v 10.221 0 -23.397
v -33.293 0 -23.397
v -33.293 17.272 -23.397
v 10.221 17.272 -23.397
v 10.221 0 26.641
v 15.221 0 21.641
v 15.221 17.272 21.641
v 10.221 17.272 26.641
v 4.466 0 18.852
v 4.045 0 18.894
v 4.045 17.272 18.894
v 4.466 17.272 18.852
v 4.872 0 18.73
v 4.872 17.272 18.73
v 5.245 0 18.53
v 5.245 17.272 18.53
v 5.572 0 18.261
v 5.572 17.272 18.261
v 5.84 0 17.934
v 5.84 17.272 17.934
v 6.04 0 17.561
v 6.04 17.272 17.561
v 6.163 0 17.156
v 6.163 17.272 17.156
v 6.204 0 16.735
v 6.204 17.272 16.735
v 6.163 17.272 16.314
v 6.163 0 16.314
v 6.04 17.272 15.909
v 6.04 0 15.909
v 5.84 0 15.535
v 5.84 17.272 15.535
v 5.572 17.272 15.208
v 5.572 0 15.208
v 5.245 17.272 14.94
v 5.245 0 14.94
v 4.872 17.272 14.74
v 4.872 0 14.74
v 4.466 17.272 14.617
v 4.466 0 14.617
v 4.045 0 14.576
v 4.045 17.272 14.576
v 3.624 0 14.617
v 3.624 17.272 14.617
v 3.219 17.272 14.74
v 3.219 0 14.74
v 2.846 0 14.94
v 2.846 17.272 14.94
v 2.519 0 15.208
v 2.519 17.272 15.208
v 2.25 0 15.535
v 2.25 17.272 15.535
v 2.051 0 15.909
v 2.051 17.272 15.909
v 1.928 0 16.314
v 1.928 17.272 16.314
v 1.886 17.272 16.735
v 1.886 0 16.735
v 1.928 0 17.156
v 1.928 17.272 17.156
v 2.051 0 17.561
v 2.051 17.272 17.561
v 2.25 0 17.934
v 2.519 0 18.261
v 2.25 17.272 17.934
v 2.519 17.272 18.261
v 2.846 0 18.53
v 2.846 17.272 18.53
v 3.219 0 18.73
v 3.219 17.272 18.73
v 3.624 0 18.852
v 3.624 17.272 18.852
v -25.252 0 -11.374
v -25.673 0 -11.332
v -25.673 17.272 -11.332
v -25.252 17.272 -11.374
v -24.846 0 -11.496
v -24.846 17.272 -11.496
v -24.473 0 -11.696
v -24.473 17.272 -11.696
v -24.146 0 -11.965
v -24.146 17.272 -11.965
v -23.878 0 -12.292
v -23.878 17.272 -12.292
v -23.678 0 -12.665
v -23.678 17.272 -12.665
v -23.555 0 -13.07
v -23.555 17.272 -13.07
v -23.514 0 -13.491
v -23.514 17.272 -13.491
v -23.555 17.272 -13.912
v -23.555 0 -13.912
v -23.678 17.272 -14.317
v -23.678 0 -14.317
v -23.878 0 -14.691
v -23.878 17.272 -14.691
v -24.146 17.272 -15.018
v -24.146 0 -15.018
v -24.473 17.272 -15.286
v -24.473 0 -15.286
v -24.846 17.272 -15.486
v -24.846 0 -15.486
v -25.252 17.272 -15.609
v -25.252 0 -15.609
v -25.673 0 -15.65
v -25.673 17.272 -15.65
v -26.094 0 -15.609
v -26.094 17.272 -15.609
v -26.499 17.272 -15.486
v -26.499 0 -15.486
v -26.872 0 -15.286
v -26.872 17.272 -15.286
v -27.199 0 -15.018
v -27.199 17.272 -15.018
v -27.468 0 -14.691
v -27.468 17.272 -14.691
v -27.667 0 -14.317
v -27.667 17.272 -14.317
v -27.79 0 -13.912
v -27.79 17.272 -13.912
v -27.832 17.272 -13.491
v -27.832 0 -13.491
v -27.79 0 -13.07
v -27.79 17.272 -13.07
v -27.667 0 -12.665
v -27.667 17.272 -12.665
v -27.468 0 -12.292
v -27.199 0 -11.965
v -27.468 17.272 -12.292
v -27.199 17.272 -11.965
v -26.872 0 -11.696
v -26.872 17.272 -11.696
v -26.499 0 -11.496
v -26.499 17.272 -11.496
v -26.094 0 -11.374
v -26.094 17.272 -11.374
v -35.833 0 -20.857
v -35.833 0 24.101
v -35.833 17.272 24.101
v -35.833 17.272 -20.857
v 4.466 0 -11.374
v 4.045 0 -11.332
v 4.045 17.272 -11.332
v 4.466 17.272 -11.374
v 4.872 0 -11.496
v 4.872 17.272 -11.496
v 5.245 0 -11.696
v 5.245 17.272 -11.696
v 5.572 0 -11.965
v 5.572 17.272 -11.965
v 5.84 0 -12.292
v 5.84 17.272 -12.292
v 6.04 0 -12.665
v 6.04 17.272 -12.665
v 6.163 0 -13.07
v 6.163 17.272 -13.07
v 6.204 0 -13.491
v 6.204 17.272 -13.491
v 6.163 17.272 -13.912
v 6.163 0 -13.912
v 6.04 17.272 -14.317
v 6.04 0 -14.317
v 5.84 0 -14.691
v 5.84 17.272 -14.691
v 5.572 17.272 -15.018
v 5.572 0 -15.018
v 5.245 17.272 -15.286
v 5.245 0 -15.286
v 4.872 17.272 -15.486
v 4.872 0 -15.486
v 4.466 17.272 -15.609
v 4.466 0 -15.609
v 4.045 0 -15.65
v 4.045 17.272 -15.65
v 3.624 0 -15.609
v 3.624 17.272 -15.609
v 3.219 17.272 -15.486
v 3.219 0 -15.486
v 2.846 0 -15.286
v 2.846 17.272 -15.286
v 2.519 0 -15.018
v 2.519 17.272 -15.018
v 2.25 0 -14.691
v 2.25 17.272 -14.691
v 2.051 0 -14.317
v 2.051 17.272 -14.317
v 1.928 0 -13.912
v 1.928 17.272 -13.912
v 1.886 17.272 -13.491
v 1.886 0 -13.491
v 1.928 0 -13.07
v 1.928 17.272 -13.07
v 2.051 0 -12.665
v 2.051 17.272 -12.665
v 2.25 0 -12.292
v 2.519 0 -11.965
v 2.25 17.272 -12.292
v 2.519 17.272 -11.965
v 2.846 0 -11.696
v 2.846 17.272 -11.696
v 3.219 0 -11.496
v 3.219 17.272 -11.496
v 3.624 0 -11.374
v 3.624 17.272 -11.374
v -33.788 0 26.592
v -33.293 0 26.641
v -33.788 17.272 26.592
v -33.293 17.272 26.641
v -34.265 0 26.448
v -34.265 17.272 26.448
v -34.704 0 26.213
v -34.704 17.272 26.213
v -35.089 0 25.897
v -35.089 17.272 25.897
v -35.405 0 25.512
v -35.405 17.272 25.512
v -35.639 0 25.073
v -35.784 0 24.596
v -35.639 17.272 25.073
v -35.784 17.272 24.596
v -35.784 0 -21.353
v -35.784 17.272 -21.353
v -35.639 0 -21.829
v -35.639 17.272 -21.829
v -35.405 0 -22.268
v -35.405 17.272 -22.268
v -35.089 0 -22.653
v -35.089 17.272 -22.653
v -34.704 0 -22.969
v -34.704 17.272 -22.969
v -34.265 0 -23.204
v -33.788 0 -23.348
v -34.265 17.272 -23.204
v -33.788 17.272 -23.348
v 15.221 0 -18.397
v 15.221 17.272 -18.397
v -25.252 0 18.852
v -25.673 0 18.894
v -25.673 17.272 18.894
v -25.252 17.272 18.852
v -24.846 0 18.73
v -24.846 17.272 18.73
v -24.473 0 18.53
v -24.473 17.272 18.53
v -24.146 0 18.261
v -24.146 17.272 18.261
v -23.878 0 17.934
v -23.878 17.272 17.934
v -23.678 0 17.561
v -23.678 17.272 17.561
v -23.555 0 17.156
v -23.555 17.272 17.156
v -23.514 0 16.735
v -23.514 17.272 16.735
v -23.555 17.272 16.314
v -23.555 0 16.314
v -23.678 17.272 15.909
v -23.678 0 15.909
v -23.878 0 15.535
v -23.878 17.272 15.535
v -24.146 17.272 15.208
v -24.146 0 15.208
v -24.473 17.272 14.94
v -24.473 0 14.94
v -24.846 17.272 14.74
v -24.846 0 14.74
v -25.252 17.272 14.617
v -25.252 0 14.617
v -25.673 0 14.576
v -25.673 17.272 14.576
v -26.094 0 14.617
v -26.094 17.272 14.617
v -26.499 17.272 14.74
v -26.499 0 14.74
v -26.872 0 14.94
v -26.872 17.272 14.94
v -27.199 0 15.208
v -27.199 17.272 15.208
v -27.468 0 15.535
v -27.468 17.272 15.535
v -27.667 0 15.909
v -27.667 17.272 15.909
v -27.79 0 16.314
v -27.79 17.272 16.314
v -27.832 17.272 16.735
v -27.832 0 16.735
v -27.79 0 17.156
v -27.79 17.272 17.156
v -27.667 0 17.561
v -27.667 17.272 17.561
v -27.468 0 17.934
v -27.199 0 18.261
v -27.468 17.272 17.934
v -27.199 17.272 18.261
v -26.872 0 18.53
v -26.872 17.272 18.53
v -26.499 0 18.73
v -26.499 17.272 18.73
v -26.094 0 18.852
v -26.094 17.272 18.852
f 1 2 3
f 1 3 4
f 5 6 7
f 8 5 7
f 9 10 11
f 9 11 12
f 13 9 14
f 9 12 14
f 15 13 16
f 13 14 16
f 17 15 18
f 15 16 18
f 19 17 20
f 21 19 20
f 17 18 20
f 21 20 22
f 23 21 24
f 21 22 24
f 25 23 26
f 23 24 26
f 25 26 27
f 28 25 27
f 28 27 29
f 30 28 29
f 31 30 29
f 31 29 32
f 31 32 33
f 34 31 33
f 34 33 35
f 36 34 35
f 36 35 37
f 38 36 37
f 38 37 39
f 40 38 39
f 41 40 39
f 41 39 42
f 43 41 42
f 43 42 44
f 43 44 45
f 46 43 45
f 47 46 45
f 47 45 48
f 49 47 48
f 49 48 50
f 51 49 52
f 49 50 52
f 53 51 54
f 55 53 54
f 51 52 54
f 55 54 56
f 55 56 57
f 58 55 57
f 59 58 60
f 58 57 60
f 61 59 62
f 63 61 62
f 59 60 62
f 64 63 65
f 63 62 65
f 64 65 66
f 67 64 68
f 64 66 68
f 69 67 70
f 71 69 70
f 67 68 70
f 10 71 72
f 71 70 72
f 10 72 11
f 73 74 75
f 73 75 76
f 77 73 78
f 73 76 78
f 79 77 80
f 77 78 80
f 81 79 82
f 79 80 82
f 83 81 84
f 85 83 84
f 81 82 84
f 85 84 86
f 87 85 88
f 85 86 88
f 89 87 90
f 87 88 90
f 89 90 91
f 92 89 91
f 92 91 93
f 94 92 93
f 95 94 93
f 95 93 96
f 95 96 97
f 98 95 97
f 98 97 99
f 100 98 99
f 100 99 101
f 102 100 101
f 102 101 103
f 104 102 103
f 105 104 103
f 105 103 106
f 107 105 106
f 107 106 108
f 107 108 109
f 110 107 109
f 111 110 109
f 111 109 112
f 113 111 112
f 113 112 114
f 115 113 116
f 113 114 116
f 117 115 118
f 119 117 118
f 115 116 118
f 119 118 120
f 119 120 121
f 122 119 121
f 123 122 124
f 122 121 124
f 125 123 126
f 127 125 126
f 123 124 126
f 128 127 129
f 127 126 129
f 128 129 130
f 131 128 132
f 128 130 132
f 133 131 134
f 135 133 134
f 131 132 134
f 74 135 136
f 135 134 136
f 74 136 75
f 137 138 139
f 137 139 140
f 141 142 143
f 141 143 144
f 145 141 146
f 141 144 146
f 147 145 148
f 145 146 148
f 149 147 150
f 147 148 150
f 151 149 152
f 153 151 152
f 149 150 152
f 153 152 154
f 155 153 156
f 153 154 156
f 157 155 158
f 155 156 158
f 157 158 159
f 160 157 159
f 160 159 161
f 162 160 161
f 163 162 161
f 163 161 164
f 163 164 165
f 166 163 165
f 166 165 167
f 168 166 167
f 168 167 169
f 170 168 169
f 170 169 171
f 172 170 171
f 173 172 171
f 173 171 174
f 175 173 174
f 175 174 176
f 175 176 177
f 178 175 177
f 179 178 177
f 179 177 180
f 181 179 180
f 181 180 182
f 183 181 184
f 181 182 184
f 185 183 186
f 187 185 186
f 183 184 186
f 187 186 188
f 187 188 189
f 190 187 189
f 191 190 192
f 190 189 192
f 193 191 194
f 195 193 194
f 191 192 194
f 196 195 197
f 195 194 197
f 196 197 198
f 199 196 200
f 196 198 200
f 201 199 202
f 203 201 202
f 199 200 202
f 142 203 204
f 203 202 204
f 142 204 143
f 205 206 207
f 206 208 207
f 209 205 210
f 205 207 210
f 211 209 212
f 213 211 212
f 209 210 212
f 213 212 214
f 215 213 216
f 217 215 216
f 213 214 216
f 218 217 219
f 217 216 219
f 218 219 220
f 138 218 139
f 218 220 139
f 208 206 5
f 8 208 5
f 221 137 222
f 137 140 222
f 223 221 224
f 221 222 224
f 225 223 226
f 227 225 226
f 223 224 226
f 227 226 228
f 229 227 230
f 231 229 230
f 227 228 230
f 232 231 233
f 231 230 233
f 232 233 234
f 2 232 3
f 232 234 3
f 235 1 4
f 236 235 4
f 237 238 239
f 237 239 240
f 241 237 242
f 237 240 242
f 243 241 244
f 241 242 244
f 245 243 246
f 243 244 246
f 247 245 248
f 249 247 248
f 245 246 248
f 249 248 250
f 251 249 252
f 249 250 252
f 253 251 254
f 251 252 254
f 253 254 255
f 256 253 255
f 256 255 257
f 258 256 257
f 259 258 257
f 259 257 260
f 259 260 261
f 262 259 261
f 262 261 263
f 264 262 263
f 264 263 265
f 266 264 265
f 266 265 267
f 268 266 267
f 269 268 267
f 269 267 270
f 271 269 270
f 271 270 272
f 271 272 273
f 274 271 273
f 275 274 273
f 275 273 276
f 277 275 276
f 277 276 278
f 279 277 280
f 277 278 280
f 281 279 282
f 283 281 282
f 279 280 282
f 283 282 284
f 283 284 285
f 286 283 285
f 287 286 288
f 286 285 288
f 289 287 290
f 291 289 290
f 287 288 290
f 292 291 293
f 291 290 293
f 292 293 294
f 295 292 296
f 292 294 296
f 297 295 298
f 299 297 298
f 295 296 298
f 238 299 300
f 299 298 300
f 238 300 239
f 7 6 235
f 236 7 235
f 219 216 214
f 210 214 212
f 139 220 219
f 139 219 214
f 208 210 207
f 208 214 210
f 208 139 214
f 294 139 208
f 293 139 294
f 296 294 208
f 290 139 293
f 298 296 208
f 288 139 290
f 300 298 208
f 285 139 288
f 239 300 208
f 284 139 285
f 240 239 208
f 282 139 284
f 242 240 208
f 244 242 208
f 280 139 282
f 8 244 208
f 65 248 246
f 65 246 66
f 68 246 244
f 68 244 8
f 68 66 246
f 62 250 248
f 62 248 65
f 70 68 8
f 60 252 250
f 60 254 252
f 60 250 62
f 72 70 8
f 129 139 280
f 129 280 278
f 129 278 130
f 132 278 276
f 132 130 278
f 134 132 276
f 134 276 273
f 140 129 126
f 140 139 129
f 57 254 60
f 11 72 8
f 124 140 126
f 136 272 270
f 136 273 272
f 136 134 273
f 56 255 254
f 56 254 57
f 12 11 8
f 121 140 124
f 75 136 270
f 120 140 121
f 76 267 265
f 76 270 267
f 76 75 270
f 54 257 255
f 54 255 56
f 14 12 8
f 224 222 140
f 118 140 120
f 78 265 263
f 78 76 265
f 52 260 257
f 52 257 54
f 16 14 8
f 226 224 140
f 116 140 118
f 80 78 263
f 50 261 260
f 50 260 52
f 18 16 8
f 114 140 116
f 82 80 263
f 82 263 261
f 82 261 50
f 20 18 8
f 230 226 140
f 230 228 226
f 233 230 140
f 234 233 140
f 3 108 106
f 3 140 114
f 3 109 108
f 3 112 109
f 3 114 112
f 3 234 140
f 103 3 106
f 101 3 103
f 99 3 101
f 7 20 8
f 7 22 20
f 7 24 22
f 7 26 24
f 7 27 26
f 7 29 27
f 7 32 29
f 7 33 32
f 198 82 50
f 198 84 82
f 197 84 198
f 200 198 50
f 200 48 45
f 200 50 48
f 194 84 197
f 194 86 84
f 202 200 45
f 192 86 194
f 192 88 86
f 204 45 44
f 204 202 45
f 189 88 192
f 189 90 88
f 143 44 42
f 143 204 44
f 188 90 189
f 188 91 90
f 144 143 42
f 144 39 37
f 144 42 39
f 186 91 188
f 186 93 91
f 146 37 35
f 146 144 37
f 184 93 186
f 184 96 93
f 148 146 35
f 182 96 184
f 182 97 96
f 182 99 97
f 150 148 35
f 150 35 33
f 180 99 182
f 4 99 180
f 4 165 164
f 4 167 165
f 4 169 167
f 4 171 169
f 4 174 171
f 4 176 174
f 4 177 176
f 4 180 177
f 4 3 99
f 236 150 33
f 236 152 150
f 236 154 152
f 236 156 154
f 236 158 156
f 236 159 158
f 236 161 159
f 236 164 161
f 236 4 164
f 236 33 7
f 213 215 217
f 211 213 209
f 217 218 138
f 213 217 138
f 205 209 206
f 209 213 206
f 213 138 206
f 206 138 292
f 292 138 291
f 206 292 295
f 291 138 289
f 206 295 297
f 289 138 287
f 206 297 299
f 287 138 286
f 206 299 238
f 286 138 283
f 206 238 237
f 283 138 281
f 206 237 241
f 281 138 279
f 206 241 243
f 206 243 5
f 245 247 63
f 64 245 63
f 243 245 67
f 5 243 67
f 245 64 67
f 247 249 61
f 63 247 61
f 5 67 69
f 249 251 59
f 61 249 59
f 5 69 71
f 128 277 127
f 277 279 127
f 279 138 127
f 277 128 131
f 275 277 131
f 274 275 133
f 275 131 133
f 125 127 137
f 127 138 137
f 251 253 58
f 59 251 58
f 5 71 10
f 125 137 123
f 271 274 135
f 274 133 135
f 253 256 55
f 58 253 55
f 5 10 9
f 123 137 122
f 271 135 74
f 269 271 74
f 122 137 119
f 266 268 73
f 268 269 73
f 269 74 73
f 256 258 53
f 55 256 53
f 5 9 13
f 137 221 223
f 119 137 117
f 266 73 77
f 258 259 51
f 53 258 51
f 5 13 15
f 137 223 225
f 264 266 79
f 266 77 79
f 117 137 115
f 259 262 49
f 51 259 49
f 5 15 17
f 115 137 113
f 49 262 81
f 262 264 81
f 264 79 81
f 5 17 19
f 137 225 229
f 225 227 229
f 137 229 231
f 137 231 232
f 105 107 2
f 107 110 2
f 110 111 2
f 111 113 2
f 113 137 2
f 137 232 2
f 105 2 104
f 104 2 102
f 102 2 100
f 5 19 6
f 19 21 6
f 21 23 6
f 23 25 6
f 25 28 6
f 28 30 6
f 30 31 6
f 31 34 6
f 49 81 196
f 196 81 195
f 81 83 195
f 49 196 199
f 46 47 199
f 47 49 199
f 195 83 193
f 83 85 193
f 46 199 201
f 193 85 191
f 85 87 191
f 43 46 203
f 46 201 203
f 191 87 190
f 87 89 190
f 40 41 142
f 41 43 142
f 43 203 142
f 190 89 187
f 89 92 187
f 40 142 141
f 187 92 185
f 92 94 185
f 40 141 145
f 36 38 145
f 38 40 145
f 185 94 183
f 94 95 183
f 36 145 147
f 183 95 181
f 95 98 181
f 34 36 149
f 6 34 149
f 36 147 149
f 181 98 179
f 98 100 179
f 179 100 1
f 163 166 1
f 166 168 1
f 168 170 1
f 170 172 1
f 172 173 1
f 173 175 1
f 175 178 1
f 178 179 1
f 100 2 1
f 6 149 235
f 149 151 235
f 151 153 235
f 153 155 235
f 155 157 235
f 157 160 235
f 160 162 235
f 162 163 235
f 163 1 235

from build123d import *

# Parameters (mm, degrees)
SKETCH1_W           = 51.054
SKETCH1_H           = 50.038
BOSS_EXTRUDE1_DEPTH = 17.272
CHAMFER1_SIZE       = 5
FILLET1_R           = 2.54
SKETCH2_R           = 2.159
CUT_EXTRUDE1_DEPTH  = 48.875253562


with BuildPart() as part:
    # Sketch1 → Boss-Extrude1 (new body)
    with BuildSketch(Plane(origin=(0, 0, 0), x_dir=(1, 0, 0), z_dir=(0, 1, 0))):
        with Locations((-10.305704367, -1.621856169)):
            Rectangle(SKETCH1_W, SKETCH1_H)
    extrude(amount=BOSS_EXTRUDE1_DEPTH)

    # Chamfer1
    chamfer1_edges = [part.edges().sort_by_distance(p)[0] for p in [
        (15.221295633, 8.636, -23.397143831),
        (15.221295633, 8.636, 26.640856169),
    ]]
    chamfer(chamfer1_edges, length=CHAMFER1_SIZE)

    # Fillet1
    fillet1_edges = [part.edges().sort_by_distance(p)[0] for p in [
        (-35.832704367, 8.636, -23.397143831),
        (-35.832704367, 8.636, 26.640856169),
    ]]
    fillet(fillet1_edges, radius=FILLET1_R)

    # Sketch2 → Cut-Extrude1 (cut, through all)
    with BuildSketch(Plane(origin=(0, 17.272, 0), x_dir=(1, 0, 0), z_dir=(0, 1, 0))):
        with Locations(Location((-25.672704367, 13.491143831, 0), (0, 0, 270))):
            Circle(SKETCH2_R)
        with Locations(Location((4.045295633, 13.491143831, 0), (0, 0, 270))):
            Circle(SKETCH2_R)
        with Locations(Location((4.045295633, -16.734856169, 0), (0, 0, 270))):
            Circle(SKETCH2_R)
        with Locations(Location((-25.672704367, -16.734856169, 0), (0, 0, 270))):
            Circle(SKETCH2_R)
    extrude(amount=-CUT_EXTRUDE1_DEPTH, mode=Mode.SUBTRACT)


solid = part.part
